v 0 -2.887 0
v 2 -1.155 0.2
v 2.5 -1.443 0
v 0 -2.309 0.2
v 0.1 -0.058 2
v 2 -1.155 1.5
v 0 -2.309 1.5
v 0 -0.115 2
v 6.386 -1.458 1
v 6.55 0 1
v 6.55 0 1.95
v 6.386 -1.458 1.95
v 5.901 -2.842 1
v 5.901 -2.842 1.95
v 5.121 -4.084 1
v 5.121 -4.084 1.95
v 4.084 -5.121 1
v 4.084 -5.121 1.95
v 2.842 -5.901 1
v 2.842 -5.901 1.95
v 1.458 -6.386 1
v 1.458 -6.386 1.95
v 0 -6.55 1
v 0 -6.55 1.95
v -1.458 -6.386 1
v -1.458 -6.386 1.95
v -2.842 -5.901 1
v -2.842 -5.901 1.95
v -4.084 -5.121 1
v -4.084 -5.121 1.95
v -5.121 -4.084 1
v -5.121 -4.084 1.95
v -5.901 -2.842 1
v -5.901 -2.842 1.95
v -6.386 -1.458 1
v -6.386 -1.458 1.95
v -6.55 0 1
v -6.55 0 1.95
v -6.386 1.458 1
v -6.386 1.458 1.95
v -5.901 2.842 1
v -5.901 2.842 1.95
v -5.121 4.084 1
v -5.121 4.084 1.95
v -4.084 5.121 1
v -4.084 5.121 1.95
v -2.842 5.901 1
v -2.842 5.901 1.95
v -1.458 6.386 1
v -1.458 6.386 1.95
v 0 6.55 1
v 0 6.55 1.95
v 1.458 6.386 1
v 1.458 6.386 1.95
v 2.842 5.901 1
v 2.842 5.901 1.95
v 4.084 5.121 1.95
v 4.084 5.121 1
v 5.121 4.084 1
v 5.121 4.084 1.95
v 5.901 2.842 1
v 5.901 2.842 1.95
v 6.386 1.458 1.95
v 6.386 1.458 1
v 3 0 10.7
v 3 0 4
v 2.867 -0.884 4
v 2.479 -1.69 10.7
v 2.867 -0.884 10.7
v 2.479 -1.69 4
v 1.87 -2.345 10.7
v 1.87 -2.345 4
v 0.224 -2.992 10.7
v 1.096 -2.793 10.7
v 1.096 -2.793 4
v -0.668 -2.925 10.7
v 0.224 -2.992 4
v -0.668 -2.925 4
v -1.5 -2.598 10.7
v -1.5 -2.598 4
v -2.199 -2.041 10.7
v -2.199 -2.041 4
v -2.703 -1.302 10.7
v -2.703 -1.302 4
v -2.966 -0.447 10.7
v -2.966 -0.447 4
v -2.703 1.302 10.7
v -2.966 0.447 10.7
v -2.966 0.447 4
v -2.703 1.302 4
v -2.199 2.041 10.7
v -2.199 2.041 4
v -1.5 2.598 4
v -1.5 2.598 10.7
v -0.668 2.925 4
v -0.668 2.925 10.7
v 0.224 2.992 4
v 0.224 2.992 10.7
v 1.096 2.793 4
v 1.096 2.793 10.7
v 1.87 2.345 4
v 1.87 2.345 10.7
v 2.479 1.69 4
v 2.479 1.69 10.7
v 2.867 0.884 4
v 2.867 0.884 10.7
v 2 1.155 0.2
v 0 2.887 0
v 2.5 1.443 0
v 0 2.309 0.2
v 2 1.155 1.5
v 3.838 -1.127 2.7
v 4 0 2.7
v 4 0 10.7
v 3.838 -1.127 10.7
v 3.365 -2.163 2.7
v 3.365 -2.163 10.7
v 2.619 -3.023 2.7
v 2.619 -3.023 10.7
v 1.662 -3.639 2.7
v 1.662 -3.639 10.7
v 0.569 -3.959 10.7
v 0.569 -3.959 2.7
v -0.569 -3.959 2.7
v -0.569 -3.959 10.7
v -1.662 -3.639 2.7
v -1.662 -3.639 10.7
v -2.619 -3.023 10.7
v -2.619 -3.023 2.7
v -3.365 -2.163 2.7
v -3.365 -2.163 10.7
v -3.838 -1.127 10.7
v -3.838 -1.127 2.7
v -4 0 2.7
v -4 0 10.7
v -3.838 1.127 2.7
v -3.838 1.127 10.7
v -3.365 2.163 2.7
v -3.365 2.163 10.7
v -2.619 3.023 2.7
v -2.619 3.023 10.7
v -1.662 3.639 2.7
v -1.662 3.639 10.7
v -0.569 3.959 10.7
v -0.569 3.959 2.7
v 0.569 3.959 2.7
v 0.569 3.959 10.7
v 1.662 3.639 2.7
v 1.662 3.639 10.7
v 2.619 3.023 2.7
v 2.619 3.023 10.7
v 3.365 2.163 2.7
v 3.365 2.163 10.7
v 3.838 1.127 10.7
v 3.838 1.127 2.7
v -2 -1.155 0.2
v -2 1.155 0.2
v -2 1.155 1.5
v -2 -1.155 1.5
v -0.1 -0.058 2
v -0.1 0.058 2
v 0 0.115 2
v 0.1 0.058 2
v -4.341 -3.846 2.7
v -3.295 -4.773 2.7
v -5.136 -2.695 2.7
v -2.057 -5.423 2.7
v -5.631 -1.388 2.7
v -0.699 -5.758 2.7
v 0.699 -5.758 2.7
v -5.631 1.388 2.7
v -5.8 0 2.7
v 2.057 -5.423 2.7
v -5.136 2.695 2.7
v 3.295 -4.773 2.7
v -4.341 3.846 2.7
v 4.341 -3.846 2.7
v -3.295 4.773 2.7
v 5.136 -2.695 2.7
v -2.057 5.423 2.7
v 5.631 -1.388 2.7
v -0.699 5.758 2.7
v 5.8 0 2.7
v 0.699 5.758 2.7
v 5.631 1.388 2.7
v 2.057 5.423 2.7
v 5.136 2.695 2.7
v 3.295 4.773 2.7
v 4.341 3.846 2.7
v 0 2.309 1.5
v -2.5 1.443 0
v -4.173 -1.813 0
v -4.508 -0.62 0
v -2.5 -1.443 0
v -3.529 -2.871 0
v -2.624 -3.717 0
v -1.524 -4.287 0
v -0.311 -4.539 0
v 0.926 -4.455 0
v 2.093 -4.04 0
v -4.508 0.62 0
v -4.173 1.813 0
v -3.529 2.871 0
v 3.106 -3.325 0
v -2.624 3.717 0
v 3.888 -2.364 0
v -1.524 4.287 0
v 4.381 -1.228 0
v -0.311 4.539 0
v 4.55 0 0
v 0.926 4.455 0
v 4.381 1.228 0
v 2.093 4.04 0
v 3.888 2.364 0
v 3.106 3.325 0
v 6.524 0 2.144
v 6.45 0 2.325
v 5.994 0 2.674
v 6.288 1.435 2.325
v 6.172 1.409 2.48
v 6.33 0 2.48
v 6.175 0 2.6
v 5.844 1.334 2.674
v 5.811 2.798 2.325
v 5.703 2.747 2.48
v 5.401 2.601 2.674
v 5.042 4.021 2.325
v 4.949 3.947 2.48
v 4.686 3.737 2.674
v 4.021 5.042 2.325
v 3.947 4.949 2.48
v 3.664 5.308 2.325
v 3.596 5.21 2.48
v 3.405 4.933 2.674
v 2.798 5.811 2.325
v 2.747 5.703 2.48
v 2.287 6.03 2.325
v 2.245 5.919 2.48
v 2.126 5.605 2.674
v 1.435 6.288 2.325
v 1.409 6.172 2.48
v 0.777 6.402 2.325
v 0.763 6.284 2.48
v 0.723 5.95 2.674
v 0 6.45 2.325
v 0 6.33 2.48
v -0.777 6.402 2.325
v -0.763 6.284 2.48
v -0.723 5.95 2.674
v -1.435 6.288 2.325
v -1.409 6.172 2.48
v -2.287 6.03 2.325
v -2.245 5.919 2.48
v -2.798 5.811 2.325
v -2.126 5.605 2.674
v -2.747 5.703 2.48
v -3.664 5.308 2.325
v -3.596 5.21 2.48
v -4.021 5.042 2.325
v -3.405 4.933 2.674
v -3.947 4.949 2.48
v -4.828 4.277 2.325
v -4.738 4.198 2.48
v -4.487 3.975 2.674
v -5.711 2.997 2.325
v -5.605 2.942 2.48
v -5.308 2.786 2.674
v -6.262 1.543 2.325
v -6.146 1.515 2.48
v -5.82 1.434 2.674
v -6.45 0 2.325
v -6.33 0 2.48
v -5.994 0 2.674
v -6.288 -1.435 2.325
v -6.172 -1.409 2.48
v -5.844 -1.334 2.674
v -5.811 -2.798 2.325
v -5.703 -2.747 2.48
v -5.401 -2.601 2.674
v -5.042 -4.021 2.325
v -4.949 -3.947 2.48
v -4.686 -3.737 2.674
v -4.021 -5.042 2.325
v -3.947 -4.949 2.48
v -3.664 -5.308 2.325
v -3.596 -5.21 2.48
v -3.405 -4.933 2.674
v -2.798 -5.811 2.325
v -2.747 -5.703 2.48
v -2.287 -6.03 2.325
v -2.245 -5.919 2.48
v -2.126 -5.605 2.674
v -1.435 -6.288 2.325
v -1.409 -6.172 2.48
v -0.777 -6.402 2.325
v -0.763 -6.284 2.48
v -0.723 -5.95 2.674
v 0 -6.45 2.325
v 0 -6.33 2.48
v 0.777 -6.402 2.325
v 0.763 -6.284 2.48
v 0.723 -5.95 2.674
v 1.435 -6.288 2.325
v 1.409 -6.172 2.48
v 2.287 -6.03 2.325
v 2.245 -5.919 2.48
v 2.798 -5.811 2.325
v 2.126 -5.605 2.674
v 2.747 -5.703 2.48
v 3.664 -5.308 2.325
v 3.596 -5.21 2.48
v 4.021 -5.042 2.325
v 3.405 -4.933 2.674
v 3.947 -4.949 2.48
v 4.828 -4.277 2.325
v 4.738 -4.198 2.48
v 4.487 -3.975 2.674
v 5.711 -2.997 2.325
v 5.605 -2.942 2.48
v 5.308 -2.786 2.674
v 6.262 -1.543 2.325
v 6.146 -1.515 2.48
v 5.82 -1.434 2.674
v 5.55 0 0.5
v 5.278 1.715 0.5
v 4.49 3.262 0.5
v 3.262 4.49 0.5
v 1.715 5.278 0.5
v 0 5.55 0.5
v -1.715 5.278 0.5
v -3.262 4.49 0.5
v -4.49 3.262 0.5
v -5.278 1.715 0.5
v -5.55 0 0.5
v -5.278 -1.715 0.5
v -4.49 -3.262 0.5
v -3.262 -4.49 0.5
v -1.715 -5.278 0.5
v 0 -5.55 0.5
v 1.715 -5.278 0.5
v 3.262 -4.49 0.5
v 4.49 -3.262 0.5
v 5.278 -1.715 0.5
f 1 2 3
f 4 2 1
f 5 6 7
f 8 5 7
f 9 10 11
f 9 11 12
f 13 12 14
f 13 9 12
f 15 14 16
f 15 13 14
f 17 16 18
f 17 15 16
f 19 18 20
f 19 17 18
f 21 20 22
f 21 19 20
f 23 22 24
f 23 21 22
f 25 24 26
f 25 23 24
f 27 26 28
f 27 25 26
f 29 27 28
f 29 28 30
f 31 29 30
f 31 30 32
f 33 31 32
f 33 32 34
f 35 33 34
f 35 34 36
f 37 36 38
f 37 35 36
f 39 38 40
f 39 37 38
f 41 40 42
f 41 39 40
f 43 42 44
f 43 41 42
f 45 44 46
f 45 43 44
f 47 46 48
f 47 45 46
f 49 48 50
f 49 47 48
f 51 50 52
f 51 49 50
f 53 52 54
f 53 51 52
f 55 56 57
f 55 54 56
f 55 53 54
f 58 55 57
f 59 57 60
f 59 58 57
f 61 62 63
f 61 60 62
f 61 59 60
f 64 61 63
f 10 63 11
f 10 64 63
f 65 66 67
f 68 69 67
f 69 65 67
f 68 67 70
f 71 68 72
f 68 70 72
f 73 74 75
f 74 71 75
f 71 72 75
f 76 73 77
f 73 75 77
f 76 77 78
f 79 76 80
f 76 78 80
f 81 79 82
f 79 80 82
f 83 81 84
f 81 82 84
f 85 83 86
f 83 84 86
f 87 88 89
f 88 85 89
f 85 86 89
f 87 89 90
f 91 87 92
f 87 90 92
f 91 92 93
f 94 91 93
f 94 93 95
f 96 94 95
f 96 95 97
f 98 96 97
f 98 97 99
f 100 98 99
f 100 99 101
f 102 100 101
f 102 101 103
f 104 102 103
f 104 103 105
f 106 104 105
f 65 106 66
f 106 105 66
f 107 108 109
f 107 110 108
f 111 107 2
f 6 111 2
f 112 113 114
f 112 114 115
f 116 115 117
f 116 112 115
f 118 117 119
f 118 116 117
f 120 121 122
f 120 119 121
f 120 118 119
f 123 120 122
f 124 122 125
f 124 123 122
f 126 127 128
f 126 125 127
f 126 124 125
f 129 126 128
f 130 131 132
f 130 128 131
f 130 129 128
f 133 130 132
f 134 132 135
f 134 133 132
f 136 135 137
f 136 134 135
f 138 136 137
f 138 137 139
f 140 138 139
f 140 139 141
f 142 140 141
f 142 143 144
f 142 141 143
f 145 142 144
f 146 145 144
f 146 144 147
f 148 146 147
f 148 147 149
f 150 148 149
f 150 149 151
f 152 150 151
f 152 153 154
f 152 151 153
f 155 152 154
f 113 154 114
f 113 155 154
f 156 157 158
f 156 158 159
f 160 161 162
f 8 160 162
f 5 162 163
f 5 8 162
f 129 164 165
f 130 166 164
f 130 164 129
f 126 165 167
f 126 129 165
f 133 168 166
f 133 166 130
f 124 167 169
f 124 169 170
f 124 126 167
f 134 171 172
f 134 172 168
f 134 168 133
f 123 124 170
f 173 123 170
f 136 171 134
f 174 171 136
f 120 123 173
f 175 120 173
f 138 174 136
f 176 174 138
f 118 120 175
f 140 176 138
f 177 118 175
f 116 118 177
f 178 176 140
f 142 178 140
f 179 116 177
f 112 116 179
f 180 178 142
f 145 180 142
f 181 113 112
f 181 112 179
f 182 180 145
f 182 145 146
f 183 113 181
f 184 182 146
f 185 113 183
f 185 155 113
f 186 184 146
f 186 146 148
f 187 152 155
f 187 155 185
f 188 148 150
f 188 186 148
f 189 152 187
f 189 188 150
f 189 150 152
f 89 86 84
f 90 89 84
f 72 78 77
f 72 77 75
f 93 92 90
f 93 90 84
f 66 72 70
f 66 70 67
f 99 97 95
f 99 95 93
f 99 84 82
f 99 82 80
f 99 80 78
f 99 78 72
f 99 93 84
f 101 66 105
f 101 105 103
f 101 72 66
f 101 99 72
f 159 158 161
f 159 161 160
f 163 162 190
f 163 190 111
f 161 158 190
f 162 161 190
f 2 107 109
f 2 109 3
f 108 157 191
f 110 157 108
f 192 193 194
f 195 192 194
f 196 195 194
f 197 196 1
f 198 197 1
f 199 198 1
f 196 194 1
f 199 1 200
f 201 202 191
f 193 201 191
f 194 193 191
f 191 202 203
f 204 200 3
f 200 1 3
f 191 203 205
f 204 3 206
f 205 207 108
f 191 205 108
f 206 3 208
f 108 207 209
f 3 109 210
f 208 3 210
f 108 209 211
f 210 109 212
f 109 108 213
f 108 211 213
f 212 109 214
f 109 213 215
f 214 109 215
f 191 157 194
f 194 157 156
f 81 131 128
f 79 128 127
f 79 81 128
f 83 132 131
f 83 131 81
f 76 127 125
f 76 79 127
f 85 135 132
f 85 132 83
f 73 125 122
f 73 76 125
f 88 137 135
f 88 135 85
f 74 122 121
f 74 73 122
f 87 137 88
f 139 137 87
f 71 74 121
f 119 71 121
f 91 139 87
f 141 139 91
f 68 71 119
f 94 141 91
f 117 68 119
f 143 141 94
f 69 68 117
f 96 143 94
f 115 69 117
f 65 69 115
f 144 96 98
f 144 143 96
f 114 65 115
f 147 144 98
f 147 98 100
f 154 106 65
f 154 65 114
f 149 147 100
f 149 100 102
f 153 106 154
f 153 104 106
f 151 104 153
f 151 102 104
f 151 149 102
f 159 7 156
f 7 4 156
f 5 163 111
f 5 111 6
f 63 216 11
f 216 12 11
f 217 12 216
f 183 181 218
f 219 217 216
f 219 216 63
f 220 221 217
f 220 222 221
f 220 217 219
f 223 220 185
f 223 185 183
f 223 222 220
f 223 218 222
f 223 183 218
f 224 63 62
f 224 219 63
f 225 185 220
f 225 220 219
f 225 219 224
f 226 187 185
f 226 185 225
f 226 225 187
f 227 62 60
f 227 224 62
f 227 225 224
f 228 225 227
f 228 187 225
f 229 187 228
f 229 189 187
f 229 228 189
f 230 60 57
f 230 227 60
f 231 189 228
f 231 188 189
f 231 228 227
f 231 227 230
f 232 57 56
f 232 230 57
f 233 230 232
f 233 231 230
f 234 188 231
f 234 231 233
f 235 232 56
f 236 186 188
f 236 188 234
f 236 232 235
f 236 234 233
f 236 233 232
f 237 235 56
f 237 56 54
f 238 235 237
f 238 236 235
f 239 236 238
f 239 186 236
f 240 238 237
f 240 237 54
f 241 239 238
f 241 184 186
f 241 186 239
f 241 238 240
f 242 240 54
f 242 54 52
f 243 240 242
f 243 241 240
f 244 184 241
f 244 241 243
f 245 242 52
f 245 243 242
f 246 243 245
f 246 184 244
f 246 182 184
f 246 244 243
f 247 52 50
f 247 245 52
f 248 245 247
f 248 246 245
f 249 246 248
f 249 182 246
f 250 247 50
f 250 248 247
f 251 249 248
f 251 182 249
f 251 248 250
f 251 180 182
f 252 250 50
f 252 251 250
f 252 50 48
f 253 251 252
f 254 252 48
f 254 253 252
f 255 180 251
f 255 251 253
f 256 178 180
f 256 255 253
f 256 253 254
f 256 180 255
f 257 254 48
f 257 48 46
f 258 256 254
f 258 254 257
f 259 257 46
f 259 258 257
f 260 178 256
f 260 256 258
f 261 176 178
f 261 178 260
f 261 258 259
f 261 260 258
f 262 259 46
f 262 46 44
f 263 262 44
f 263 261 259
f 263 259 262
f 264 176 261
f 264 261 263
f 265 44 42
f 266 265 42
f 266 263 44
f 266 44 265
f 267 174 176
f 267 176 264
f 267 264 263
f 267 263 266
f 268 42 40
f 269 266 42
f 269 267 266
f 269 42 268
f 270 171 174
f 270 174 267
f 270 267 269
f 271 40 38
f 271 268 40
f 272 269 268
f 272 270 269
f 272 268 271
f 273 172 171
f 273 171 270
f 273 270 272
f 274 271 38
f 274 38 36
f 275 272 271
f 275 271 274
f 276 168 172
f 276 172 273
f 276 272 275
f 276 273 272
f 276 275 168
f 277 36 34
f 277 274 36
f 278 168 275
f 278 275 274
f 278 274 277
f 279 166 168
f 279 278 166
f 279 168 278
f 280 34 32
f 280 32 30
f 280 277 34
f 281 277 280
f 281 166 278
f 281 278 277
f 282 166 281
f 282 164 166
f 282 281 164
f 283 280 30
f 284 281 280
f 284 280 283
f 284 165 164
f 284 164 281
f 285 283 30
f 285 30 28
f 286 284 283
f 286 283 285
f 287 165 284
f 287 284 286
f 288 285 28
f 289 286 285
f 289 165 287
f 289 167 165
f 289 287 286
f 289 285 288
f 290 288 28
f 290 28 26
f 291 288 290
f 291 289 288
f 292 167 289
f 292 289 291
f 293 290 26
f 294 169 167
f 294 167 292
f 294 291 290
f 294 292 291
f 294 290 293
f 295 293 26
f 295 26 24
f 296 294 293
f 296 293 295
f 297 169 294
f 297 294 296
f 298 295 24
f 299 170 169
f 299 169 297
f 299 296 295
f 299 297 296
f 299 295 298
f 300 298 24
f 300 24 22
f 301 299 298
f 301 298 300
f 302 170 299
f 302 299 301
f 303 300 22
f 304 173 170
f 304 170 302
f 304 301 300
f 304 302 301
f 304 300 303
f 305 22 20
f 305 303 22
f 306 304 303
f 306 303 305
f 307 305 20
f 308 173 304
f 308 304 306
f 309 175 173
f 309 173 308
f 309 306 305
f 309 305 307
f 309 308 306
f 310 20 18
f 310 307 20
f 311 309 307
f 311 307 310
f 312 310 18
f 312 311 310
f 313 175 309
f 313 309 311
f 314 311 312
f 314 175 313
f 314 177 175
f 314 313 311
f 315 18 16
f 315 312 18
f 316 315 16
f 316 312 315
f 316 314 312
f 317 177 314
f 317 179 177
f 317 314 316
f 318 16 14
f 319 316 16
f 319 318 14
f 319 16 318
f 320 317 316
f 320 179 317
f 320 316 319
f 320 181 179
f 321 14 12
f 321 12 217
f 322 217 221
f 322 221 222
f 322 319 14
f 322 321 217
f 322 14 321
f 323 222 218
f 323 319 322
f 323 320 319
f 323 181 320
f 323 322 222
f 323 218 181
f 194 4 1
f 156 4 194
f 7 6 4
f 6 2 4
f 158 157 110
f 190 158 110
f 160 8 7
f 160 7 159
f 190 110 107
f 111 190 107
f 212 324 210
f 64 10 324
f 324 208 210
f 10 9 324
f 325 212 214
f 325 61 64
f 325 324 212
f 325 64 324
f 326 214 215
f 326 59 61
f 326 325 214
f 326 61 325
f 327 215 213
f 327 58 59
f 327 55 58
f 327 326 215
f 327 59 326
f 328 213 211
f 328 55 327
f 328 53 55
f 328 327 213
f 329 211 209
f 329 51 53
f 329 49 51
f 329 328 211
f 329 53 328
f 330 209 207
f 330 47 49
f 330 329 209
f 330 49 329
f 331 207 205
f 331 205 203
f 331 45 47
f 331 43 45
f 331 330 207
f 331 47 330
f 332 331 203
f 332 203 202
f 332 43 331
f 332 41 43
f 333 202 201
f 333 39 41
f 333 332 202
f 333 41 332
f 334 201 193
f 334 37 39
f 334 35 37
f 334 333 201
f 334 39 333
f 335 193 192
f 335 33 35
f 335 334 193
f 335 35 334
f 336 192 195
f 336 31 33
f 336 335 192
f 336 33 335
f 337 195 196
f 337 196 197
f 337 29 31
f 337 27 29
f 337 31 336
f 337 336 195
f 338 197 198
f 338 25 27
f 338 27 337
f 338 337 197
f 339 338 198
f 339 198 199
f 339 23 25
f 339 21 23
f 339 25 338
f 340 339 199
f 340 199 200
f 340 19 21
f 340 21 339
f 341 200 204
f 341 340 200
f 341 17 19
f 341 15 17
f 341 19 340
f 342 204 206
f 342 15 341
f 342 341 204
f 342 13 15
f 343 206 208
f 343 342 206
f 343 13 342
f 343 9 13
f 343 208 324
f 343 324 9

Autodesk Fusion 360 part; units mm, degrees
sketch "Sketch1" plane through (0, 0, 0) normal (0, 0, 1) x (1, 0, 0)
  circle A0 centre (0, 0) radius 4
  circle A1 centre (0, 0) radius 3
  circle A2 centre (0, 0) radius 6.55
  dimension "d1" = 8
  dimension "d2" = 6
  dimension "d3" = 13.1
extrude "Extrude1" add sketch "Sketch1" along normal blind 2.7 makes body 1 at (6.5419, -0.3265, 1.8) makes body 2 at (2.9963, -0.1495, 1.8)
extrude "Extrude2" add 1 faces at (-1.1591, 0.5829, 2.7) along direction (0, 0, 1) blind 1.3 on bodies 2 bodies 2
extrude "Extrude3" add sketch "Sketch1" along normal blind 10.7 contours A0 bodies 1 2
sketch "Sketch2" plane through (0, 0, 0) normal (0, 0, -1) x (1, 0, 0)
  circle A0 centre (0, 0) radius 6.55
  line L0 (-2, 0) -> (2, 0) construction
  line L1 (1, -1.7321) -> (-1, 1.7321) construction
  line L2 (1, 1.7321) -> (-1, -1.7321) construction
  line L3 (-2, -2.5) -> (-2, 2.5) construction
  line L4 (-2, 2.5) -> (2, 2.5) construction
  line L5 (2, 2.5) -> (2, -2.5) construction
  line L6 (2, -2.5) -> (-2, -2.5) construction
  line L7 (-1, -1.7321) -> (-2, -1.1547) construction
  line L8 (-1, 1.7321) -> (-2, 1.1547) construction
  line L9 (-2, -1.1547) -> (-2, 1.1547)
  line L10 (1, -1.7321) -> (2, -1.1547) construction
  line L11 (1, 1.7321) -> (2, 1.1547) construction
  line L12 (-2, -1.1547) -> (0, -2.3094)
  line L13 (0, -2.3094) -> (2, -1.1547)
  line L14 (2, 1.1547) -> (0, 2.3094)
  line L15 (0, 2.3094) -> (-2, 1.1547)
  line L16 (2, -1.1547) -> (2, 1.1547)
  dimension "d10" = 4
  dimension "d12" = 360
extrude "Extrude4" cut sketch "Sketch2" against normal blind 2 contours L9 L12 L13 L14 L15 L16 bodies 1
chamfer "Chamfer1" distance 0.5 distance2 1.9 6 edges at (-1, 1.7321, 2) (1, 1.7321, 2) (2, 0, 2) (1, -1.7321, 2) (-2, 0, 2) (-1, -1.7321, 2) measured on face at (-1.3333, 1.5396, 0.6667) measured on face at (0.6667, 1.9245, 0.6667) measured on face at (2, 0.3849, 0.6667) measured on face at (1.3333, -1.5396, 0.6667) measured on face at (-2, 0.3849, 0.6667) measured on face at (-0.6667, -1.9245, 0.6667) on bodies 1
chamfer "Chamfer2" distance 0.5 distance2 0.2 6 edges at (2, 0, 0) (1, -1.7321, 0) (-1, -1.7321, 0) (-2, 0, 0) (-1, 1.7321, 0) (1, 1.7321, 0) measured on face at (1.7583, -3.0455, 0) measured on face at (1.7583, -3.0455, 0) measured on face at (1.7583, -3.0455, 0) measured on face at (1.7583, -3.0455, 0) measured on face at (1.7583, -3.0455, 0) measured on face at (1.7583, -3.0455, 0) on bodies 1
chamfer "Chamfer3" distance 1 distance2 2 1 edges at (-6.1067, -2.3686, 0) measured on face at (6.5419, -0.3265, 1.8) on bodies 1
fillet "Fillet1" radius 0.75 1 edges at (-6.1067, -2.3686, 2.7) on bodies 1
